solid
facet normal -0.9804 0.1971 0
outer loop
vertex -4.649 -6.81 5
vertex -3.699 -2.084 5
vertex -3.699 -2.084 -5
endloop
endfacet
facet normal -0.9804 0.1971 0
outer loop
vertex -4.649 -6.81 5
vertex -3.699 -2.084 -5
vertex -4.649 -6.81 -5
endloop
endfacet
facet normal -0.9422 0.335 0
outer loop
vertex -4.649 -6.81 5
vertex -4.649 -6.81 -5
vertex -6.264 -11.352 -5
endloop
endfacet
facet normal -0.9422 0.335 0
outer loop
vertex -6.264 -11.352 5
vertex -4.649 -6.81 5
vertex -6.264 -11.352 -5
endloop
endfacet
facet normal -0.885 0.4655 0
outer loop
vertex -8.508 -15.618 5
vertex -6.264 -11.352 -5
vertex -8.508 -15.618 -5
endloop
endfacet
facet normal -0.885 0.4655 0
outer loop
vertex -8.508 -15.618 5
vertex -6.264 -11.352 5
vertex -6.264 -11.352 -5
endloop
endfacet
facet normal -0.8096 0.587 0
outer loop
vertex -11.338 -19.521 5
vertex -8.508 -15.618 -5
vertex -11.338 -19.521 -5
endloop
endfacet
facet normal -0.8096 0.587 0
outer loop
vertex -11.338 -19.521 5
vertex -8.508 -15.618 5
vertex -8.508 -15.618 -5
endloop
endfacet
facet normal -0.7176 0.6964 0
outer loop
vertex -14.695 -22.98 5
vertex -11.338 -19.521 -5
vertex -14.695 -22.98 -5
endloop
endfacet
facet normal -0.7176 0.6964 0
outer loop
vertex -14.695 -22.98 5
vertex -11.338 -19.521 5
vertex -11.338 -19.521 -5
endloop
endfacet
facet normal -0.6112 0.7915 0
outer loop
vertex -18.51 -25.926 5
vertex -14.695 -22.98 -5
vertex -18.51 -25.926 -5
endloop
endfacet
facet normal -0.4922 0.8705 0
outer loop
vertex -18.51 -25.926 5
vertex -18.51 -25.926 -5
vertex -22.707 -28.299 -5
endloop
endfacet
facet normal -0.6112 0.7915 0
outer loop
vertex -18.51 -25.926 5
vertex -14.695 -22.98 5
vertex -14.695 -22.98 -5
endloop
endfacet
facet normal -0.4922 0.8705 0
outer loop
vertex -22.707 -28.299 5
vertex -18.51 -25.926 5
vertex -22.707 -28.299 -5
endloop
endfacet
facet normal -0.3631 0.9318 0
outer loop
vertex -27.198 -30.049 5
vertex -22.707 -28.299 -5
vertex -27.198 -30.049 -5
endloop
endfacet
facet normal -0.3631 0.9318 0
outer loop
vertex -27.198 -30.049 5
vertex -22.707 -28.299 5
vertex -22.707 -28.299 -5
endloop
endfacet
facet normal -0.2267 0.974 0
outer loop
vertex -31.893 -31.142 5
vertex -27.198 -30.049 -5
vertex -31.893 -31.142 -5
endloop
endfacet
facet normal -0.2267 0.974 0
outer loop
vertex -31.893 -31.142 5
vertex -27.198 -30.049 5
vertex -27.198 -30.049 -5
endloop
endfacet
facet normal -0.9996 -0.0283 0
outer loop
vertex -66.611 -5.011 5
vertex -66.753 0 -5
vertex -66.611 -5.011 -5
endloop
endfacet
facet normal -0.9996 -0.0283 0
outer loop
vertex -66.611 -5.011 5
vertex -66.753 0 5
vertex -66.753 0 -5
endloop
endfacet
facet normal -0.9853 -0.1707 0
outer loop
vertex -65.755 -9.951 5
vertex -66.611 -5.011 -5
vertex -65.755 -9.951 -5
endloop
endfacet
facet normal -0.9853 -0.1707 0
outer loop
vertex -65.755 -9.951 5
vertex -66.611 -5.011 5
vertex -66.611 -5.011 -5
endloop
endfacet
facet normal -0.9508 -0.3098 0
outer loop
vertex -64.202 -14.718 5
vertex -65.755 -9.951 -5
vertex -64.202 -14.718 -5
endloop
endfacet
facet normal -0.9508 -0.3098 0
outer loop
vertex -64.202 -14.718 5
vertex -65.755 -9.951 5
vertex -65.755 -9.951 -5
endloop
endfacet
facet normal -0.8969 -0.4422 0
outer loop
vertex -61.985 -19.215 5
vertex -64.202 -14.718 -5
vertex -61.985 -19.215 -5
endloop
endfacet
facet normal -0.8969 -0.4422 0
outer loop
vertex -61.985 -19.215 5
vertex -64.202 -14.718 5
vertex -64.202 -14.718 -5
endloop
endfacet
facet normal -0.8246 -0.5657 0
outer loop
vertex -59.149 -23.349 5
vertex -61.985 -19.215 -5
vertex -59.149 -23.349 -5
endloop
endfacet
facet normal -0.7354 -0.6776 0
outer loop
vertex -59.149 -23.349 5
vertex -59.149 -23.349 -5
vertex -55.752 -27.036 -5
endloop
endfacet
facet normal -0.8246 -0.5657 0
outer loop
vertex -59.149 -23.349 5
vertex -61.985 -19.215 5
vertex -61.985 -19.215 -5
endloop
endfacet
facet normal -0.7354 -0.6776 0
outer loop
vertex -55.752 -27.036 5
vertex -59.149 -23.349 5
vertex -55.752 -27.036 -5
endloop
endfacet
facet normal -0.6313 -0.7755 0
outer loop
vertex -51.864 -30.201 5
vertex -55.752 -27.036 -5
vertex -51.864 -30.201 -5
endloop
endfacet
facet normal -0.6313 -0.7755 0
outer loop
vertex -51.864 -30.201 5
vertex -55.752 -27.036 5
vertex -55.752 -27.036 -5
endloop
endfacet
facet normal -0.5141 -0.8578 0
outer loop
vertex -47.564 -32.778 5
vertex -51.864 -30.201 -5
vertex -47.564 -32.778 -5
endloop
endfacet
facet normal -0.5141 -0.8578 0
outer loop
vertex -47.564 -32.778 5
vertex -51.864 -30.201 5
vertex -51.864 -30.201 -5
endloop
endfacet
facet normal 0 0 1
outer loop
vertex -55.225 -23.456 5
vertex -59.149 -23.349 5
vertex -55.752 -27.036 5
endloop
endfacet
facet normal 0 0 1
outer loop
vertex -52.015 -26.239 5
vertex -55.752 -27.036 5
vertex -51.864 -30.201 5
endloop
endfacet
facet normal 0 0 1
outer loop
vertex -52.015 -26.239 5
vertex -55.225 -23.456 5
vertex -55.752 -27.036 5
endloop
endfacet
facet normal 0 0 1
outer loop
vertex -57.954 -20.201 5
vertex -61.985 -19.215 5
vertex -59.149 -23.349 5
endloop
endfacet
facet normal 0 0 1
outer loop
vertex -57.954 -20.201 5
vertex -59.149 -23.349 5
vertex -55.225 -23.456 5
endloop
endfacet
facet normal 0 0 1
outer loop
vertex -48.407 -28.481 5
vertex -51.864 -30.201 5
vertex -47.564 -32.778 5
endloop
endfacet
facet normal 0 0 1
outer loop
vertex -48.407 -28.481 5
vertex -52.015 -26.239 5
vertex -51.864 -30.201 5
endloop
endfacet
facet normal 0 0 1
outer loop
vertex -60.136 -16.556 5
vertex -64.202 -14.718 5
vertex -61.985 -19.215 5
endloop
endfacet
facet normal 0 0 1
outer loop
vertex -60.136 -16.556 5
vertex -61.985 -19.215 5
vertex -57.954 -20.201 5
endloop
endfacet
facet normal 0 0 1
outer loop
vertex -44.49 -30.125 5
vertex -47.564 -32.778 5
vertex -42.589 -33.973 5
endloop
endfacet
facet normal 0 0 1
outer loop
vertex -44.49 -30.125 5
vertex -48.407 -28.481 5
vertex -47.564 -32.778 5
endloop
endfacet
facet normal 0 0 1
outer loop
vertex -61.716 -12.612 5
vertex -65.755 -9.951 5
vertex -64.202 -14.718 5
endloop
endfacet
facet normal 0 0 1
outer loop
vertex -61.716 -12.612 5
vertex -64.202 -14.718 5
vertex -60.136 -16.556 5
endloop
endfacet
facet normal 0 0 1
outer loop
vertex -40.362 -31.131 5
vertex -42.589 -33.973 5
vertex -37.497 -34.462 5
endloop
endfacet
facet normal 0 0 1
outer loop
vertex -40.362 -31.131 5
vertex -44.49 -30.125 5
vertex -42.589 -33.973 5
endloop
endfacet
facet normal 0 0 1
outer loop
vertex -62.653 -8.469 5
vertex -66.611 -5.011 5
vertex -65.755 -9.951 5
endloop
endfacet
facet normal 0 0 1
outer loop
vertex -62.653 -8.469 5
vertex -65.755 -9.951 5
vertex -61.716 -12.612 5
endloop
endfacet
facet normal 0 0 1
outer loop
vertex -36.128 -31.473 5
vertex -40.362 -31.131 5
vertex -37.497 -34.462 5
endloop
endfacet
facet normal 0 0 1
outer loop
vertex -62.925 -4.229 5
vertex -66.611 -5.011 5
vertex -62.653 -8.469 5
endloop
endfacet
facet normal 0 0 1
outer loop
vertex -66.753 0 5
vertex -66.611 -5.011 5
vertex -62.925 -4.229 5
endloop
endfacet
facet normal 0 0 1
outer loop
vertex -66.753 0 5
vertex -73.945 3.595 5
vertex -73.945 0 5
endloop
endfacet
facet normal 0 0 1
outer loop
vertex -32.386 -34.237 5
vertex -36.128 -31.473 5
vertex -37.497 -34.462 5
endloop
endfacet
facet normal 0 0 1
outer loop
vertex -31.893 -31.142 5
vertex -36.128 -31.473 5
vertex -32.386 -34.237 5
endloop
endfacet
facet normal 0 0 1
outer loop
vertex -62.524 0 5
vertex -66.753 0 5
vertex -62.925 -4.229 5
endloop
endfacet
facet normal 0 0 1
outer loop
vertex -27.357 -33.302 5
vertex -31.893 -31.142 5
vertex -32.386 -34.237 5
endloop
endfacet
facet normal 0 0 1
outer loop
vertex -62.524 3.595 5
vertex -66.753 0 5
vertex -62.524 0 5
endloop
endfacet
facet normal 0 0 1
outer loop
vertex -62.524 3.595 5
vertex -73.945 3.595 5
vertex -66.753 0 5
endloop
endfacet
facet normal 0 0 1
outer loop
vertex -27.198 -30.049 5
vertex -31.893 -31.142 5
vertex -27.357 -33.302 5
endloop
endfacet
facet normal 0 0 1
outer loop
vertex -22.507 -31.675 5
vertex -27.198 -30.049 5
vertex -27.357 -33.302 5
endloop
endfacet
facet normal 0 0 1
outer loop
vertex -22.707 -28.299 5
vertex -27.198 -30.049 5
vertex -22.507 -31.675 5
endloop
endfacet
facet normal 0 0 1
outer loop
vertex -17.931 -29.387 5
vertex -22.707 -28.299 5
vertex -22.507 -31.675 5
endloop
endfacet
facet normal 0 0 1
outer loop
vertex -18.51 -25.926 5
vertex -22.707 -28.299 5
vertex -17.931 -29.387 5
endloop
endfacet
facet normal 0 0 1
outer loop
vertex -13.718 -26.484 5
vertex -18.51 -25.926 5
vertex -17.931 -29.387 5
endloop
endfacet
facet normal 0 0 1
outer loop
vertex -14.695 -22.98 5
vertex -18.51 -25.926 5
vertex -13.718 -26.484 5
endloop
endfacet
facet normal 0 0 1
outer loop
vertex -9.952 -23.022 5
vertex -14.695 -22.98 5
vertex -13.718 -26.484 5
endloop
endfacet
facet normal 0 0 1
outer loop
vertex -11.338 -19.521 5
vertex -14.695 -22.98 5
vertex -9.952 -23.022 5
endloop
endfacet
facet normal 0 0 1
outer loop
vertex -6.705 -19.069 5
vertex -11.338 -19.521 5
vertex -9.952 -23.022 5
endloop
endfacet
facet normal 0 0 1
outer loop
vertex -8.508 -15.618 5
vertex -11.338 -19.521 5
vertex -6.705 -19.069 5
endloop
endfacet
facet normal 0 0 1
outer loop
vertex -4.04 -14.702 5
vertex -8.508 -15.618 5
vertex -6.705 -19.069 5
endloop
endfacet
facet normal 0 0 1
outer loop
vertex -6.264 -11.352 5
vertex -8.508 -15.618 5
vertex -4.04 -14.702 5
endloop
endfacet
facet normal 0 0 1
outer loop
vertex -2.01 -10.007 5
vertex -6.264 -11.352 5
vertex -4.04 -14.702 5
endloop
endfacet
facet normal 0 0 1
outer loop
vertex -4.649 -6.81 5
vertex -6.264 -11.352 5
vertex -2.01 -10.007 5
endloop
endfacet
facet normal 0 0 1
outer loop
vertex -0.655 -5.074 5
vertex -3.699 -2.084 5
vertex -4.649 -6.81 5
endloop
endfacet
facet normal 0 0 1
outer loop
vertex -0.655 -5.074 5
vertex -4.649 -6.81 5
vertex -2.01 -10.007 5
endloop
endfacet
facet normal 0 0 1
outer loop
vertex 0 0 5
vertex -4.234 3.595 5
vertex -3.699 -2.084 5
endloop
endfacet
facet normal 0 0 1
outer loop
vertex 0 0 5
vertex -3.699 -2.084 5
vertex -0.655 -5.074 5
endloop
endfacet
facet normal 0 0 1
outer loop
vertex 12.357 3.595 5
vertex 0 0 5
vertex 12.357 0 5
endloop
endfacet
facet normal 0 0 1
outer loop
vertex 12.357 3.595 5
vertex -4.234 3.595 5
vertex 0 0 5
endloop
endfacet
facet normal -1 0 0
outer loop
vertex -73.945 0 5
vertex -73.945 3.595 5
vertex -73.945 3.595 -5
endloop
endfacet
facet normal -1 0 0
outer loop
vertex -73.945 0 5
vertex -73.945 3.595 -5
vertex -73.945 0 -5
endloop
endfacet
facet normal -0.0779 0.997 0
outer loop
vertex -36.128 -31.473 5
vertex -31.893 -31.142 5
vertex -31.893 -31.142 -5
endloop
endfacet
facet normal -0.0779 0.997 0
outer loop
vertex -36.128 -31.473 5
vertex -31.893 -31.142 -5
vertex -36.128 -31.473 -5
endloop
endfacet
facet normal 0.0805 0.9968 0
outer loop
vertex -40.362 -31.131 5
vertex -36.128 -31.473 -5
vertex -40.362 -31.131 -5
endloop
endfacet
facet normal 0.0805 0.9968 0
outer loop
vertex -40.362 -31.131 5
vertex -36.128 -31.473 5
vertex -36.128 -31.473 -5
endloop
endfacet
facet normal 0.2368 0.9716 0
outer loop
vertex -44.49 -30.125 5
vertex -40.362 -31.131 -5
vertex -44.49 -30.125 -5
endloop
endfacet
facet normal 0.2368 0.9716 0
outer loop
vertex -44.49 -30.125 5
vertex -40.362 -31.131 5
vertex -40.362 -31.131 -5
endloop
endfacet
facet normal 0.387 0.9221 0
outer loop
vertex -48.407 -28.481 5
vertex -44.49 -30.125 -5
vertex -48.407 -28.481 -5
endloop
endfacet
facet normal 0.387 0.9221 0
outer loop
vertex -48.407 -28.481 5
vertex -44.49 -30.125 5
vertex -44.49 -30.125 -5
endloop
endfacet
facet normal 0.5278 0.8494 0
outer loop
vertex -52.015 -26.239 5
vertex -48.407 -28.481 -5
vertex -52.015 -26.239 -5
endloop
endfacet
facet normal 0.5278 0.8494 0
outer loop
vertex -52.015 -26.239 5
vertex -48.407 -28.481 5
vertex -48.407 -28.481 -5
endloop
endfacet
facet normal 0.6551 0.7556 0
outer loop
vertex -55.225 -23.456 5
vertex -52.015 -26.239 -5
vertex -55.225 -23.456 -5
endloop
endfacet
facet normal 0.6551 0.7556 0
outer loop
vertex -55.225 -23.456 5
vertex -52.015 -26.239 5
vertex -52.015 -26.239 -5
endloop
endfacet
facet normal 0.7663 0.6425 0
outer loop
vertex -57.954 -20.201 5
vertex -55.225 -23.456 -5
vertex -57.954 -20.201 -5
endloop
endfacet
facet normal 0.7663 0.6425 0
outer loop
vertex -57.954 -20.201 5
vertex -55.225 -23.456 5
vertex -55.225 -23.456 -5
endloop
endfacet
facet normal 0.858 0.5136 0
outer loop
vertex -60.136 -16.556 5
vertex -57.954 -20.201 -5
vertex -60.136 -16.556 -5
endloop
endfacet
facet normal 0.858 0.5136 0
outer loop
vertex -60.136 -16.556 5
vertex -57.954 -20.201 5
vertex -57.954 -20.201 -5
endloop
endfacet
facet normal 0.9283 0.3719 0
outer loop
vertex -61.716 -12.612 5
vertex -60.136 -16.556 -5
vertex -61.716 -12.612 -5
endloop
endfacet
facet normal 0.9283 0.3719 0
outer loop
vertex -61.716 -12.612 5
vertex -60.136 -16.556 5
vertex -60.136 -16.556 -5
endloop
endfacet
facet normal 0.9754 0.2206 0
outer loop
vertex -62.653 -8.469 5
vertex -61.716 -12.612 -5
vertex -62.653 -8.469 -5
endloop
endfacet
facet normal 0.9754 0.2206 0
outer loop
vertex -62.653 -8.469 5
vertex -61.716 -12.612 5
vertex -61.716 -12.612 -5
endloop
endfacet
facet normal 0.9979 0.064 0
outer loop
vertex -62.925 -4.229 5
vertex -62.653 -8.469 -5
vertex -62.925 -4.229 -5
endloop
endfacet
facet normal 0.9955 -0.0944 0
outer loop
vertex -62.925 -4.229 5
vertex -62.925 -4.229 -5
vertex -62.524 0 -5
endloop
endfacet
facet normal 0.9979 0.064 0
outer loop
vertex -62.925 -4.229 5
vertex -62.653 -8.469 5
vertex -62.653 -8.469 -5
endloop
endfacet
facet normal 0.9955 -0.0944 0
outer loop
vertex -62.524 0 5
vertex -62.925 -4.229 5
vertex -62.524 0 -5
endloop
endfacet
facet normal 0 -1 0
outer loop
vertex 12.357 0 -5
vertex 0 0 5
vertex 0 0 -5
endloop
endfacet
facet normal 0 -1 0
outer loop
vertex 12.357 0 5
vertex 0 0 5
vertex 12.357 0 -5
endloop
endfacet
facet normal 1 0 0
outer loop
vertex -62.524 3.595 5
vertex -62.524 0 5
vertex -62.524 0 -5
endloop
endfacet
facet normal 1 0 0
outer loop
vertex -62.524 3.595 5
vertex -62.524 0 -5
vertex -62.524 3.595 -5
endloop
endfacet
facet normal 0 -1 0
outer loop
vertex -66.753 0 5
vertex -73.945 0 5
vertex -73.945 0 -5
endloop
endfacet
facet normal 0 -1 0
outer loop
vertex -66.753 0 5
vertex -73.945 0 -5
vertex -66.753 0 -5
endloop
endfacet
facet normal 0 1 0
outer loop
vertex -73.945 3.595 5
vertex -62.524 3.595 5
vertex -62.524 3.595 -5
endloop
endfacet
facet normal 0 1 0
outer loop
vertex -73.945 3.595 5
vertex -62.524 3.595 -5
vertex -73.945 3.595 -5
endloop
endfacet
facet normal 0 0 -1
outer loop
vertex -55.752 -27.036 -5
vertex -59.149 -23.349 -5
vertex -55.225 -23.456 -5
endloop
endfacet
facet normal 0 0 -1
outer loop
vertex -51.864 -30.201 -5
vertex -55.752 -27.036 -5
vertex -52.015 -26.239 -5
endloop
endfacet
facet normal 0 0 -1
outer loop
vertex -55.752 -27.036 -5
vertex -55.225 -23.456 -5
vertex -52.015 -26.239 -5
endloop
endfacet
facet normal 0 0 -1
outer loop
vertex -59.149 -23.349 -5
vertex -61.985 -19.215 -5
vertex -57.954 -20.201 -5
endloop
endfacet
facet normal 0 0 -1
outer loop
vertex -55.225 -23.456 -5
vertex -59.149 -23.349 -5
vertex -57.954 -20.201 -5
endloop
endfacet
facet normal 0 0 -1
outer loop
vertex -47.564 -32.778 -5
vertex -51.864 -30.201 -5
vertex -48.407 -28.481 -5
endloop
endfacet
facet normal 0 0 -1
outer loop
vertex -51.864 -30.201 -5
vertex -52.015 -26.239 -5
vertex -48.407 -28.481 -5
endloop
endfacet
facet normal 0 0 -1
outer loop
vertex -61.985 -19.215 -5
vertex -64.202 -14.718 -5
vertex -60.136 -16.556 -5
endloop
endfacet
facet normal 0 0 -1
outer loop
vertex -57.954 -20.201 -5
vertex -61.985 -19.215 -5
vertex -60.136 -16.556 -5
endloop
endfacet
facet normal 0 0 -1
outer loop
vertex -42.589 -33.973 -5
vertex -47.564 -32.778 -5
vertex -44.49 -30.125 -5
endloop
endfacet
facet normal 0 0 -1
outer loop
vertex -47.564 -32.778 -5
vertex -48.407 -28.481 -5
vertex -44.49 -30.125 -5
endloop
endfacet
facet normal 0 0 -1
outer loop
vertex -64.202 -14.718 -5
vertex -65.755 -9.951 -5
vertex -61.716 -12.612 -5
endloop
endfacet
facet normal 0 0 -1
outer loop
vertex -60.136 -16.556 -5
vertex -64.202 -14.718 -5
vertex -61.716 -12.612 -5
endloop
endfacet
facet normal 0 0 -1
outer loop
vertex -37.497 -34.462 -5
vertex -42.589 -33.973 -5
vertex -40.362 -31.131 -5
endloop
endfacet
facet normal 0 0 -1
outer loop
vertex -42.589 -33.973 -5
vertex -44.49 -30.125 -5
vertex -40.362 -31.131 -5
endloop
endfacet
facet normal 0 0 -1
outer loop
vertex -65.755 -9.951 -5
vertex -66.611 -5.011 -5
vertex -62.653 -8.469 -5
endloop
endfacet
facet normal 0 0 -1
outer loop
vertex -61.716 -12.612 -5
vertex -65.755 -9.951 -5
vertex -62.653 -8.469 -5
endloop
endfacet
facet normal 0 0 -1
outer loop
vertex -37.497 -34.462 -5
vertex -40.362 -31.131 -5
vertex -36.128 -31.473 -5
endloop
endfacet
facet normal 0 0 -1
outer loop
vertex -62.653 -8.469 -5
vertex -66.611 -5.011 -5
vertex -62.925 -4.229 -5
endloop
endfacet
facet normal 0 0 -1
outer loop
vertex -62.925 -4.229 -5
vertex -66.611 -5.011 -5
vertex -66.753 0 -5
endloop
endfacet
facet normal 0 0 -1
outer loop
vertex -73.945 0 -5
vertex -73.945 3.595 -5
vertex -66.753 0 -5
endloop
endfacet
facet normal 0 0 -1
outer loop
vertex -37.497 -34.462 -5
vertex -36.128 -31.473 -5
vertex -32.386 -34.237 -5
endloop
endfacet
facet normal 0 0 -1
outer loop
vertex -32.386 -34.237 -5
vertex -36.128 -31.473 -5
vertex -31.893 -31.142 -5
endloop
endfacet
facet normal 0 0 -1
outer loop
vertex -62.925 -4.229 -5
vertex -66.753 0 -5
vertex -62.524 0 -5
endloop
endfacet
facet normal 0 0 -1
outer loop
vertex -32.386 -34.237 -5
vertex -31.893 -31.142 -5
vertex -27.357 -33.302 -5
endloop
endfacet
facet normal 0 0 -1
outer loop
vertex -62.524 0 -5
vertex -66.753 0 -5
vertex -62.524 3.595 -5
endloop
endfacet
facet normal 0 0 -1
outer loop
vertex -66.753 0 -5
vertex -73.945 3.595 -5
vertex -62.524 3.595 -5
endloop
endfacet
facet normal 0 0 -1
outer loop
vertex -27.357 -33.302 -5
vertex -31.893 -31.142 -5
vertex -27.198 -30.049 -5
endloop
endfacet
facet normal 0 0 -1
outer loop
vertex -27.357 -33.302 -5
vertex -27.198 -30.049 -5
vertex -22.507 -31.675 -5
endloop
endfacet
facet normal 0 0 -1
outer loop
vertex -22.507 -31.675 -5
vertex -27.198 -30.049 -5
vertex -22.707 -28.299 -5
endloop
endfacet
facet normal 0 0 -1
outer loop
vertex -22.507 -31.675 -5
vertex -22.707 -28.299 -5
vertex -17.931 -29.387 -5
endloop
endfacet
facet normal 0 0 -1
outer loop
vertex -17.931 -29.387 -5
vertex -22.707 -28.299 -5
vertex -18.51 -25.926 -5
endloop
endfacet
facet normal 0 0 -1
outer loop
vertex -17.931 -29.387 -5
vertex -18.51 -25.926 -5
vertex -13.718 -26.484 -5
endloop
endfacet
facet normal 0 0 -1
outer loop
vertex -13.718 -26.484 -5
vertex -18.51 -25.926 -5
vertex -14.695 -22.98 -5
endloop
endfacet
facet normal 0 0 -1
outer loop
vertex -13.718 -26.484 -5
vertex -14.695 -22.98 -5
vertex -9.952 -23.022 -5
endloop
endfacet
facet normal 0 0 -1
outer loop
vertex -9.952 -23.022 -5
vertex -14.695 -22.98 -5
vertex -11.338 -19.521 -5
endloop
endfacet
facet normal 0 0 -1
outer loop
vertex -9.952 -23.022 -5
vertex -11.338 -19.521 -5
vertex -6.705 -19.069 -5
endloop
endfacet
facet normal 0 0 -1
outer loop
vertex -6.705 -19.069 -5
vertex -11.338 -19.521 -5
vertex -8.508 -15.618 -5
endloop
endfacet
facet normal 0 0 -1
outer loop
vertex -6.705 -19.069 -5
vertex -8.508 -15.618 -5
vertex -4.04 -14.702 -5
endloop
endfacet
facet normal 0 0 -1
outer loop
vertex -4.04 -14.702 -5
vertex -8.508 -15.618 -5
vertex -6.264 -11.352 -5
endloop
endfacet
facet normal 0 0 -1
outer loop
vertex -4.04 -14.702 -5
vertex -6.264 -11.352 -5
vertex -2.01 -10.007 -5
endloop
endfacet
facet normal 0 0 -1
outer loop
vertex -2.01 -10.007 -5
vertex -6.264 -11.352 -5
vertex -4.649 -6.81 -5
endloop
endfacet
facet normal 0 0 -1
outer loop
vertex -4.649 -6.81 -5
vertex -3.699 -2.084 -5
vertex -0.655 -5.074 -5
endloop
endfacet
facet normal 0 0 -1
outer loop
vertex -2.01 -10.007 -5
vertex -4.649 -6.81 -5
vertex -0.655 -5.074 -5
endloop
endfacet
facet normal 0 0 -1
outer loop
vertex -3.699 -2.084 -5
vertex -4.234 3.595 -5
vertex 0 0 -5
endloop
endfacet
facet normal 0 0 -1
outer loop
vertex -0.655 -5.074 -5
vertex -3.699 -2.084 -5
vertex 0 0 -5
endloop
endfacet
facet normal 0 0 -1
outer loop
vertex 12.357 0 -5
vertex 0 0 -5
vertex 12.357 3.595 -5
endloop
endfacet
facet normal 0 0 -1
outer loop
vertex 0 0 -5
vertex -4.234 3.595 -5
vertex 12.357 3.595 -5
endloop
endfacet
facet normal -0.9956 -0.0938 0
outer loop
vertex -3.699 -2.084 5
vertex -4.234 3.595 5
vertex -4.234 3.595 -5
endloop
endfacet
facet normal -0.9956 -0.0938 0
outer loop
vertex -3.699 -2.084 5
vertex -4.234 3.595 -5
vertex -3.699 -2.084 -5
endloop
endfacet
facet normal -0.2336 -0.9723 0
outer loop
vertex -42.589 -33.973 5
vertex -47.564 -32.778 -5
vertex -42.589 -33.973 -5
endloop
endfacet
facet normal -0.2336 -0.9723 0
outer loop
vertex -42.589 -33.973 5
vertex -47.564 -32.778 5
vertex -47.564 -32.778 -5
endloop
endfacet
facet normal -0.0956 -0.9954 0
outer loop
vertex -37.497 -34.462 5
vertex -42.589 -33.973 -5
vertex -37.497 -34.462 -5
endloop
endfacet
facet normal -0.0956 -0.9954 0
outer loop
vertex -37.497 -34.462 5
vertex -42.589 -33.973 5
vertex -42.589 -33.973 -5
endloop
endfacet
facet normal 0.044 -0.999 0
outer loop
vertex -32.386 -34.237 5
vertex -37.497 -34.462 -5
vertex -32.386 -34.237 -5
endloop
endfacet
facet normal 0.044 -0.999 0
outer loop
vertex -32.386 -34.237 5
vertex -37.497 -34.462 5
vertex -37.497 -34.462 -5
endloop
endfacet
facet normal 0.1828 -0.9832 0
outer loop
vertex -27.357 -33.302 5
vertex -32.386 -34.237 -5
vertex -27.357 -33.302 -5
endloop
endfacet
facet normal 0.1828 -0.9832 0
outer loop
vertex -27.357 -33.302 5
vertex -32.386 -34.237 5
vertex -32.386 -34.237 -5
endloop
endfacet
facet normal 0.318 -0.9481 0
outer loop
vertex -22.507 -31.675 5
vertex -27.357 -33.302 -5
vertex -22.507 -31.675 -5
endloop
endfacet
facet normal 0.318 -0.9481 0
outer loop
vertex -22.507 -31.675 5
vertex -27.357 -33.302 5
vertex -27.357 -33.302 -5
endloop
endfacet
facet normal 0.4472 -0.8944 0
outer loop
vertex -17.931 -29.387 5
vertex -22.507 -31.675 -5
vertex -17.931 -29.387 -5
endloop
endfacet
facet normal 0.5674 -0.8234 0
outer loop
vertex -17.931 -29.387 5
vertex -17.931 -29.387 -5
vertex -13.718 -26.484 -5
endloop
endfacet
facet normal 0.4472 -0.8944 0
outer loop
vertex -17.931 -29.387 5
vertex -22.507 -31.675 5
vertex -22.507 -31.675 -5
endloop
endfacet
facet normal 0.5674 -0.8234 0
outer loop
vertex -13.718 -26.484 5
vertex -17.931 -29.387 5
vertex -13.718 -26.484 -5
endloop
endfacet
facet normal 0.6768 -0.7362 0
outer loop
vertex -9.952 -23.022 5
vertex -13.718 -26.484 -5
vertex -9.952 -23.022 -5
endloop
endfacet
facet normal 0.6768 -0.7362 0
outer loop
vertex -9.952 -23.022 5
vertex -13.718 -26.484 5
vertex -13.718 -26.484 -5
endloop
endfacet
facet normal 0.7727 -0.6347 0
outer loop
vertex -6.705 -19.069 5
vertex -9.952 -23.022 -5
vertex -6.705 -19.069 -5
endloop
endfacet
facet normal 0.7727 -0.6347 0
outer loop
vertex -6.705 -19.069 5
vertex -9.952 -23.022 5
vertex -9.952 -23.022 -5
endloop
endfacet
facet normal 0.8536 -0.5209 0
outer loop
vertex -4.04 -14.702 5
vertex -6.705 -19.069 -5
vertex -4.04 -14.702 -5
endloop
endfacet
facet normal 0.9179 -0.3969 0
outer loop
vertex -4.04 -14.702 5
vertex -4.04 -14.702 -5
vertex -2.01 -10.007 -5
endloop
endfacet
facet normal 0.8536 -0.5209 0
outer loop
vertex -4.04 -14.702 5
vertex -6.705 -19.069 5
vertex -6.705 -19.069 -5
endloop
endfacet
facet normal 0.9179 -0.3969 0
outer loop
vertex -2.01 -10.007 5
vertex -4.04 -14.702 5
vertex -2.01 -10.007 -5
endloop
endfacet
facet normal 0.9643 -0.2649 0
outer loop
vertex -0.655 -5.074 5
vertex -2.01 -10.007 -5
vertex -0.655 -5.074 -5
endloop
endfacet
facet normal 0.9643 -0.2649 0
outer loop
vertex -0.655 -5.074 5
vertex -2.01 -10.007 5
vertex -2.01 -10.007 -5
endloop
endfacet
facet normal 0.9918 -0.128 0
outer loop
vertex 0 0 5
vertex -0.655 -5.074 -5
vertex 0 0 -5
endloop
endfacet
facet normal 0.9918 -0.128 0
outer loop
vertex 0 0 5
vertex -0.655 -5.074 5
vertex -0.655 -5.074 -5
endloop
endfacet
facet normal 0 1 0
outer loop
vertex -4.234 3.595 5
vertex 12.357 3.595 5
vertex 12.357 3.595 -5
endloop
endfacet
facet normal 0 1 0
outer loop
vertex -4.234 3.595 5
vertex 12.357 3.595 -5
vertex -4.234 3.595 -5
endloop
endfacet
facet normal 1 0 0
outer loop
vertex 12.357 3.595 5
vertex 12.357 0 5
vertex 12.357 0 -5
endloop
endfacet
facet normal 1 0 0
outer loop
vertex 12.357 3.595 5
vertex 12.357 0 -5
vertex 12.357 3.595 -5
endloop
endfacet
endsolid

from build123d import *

# Parameters (mm, degrees)
EXTRUDE_1_DEPTH = 5


with BuildPart() as part:
    # 스케치1 → 보스-돌출1 (new, symmetric)
    with BuildSketch(Plane.XY):
        with BuildLine():
            Line((0, 0), (12.356704667, 0))
            Line((12.356704667, 0), (12.356704667, 3.595174958))
            Line((12.356704667, 3.595174958), (-4.233976366, 3.595174958))
            Line((-4.233976366, 3.595174958), (-3.698633078, -2.084492479))
            ThreePointArc((-3.698633078, -2.084492479), (-12.954718886, -21.310351029), (-31.892829031, -31.141767286))
            ThreePointArc((-31.892829031, -31.141767286), (-55.224518939, -23.45562289), (-62.523719203, 0))
            Line((-62.523719203, 0), (-62.523719203, 3.595174958))
            Line((-62.523719203, 3.595174958), (-73.944795268, 3.595174958))
            Line((-73.944795268, 3.595174958), (-73.944795268, 0))
            Line((-73.944795268, 0), (-66.753336801, 0))
            ThreePointArc((-66.753336801, 0), (-61.985172369, -19.214758492), (-47.563771697, -32.778148135))
            ThreePointArc((-47.563771697, -32.778148135), (-15.773872786, -28.009355466), (0, 0))
        make_face()
    extrude(amount=EXTRUDE_1_DEPTH, both=True)


solid = part.part
